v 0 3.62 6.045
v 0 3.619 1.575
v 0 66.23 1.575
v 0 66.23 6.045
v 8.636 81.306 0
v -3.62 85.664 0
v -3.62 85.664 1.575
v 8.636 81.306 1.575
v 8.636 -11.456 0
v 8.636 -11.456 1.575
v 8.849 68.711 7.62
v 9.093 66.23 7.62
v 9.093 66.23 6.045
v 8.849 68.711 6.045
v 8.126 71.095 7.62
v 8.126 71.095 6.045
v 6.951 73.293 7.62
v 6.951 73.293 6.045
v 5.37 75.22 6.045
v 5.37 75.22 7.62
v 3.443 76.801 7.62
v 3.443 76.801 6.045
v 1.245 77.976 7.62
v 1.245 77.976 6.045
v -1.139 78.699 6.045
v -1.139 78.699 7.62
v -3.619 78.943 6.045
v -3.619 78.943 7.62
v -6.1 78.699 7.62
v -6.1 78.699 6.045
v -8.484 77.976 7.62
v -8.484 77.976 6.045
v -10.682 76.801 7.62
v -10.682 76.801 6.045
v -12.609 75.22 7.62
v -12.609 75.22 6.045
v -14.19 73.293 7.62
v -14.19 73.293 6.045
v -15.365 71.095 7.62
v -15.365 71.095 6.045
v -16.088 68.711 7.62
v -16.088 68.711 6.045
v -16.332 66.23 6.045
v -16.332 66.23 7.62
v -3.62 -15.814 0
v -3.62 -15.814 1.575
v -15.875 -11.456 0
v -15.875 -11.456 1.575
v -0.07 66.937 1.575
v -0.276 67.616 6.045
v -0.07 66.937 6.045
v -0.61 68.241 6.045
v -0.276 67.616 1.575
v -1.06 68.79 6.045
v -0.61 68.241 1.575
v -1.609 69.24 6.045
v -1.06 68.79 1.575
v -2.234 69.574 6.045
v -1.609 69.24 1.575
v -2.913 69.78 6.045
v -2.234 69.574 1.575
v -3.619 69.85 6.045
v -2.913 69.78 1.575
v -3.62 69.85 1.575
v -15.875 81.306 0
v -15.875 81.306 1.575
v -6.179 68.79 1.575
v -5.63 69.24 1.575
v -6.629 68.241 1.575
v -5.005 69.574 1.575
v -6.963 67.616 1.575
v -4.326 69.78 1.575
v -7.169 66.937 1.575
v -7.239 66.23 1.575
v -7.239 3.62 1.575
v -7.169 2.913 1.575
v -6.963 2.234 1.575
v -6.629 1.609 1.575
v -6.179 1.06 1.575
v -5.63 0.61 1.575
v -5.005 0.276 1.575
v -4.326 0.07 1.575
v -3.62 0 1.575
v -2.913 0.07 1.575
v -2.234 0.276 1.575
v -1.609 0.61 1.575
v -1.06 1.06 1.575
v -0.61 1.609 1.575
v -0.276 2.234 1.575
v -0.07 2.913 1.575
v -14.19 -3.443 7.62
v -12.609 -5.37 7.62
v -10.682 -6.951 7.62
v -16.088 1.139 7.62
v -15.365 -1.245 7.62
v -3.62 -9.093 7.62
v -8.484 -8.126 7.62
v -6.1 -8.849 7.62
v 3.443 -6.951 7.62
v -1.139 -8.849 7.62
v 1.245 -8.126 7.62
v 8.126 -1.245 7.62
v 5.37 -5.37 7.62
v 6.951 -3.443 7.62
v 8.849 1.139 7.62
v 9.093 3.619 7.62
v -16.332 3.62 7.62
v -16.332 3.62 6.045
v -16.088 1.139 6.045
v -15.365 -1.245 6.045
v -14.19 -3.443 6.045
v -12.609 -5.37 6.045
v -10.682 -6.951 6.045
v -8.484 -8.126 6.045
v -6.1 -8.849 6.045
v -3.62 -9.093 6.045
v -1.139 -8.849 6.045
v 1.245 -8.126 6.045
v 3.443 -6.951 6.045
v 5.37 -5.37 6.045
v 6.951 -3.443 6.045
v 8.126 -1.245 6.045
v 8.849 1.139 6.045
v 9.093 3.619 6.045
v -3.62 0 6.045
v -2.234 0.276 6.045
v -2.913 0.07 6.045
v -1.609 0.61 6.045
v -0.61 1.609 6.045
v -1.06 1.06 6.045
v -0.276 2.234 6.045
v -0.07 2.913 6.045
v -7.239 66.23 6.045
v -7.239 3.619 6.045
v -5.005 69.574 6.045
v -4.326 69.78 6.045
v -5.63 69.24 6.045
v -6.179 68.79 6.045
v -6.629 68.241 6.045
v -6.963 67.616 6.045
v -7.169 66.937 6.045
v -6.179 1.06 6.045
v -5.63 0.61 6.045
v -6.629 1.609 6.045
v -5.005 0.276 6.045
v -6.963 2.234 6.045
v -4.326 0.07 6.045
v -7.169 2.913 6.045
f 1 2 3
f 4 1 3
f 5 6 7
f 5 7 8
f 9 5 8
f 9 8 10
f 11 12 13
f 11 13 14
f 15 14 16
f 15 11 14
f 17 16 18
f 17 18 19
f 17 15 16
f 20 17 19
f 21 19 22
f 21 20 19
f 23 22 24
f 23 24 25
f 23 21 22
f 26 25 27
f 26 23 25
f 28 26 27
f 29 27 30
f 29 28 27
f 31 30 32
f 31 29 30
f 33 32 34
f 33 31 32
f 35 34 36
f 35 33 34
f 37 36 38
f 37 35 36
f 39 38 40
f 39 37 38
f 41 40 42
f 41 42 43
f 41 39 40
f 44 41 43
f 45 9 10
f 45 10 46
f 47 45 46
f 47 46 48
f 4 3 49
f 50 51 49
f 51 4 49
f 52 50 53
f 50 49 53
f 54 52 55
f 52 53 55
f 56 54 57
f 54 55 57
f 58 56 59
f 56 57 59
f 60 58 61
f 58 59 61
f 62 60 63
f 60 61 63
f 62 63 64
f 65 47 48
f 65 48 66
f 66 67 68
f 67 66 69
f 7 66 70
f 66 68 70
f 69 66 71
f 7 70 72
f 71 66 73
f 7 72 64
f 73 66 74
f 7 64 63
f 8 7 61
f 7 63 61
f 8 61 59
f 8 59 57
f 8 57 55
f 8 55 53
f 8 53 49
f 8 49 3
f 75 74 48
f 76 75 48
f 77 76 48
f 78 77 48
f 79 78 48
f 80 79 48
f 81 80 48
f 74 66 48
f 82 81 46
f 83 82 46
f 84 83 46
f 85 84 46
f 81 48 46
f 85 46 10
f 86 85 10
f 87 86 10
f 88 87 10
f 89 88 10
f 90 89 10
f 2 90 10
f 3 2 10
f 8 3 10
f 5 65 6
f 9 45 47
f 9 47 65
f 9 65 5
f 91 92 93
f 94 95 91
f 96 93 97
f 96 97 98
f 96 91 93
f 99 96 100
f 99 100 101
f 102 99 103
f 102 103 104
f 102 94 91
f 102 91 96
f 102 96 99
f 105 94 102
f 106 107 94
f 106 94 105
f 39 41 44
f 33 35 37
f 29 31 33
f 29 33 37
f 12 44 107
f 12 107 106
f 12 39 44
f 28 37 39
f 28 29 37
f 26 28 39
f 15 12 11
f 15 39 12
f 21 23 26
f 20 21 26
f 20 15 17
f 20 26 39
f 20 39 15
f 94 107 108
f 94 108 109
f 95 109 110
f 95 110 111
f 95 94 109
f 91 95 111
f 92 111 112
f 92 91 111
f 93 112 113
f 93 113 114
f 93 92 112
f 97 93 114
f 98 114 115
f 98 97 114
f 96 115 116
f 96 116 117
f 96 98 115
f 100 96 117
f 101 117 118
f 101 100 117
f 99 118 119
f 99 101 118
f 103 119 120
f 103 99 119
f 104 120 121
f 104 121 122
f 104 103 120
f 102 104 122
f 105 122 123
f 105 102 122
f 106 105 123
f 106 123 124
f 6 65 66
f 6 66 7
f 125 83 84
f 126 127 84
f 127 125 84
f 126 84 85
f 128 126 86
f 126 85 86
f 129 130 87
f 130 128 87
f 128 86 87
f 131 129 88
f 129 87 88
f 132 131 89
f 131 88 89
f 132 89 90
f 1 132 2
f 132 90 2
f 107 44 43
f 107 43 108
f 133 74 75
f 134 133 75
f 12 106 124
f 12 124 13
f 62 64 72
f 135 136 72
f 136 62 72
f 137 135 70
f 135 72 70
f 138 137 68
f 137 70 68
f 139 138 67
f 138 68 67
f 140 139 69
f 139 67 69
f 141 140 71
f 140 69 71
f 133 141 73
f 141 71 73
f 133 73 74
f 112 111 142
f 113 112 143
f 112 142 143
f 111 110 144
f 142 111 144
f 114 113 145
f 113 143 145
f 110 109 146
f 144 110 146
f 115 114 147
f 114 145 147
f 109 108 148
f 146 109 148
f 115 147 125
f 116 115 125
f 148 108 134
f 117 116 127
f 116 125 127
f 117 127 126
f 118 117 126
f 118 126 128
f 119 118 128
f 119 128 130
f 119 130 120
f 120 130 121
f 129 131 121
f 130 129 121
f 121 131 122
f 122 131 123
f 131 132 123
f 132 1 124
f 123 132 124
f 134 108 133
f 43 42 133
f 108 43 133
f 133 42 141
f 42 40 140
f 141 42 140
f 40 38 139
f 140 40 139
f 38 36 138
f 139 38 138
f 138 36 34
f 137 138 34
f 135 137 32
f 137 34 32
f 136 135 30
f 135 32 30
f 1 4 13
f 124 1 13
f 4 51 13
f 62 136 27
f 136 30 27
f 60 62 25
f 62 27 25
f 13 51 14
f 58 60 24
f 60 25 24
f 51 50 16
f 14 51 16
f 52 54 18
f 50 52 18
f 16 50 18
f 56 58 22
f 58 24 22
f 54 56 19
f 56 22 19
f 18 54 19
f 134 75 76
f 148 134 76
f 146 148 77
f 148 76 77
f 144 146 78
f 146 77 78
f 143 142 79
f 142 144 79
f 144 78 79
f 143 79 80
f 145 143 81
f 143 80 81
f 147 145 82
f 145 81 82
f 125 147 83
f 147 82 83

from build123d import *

# Parameters (mm, degrees)
F1_DEPTH = 7.62
F3_DEPTH = 1.5748
F5_DEPTH = 1.5748


with BuildPart() as f1:
    # F0 (on Top) → F1 (new body)
    with BuildSketch(Plane.XY):
        with BuildLine():
            ThreePointArc((-3.6195, 0), (-1.060127, 1.060127), (0, 3.6195))
            Line((0, 3.6195), (0, 66.2305))
            ThreePointArc((0, 66.2305), (-1.060127, 68.789873), (-3.6195, 69.85))
            ThreePointArc((-3.6195, 69.85), (-6.178873, 68.789873), (-7.239, 66.2305))
            Line((-7.239, 66.2305), (-7.239, 3.6195))
            ThreePointArc((-7.239, 3.6195), (-6.178873, 1.060127), (-3.6195, 0))
        make_face()
    extrude(amount=F1_DEPTH)

    # F2 (on face) → F3 (join)
    with BuildSketch(Plane(origin=(0, 0, 0), x_dir=(1, 0, 0), z_dir=(0, 0, -1))):
        Polygon((8.636, 11.456368), (-3.6195, 15.813879), (-15.875, 11.456368), (-15.875, -3.6195), (-15.875, -66.2305), (-15.875, -81.306368), (-3.6195, -85.663879), (8.636, -81.306368), (8.636, -66.2305), (8.636, -3.6195), align=None)
        with BuildLine():
            ThreePointArc((-7.239, -3.6195), (-3.6195, 0), (0, -3.6195))
            Line((0, -3.6195), (0, -66.2305))
            ThreePointArc((0, -66.2305), (-3.6195, -69.85), (-7.239, -66.2305))
            Line((-7.239, -66.2305), (-7.239, -3.6195))
        make_face(mode=Mode.SUBTRACT)
    extrude(amount=-F3_DEPTH)

    # F4 (on face) → F5 (join)
    with BuildSketch(Plane.XY.offset(7.62)):
        with BuildLine():
            ThreePointArc((9.0932, 66.2305), (-3.6195, 78.9432), (-16.3322, 66.2305))
            Line((-16.3322, 66.2305), (-16.3322, 3.6195))
            ThreePointArc((-16.3322, 3.6195), (-3.6195, -9.0932), (9.0932, 3.6195))
            Line((9.0932, 3.6195), (9.0932, 66.2305))
        make_face()
        with BuildLine():
            ThreePointArc((0, 3.6195), (-3.6195, 0), (-7.239, 3.6195))
            Line((-7.239, 3.6195), (-7.239, 66.2305))
            ThreePointArc((-7.239, 66.2305), (-3.6195, 69.85), (0, 66.2305))
            Line((0, 66.2305), (0, 3.6195))
        make_face(mode=Mode.SUBTRACT)
    extrude(amount=-F5_DEPTH)


solid = f1.part
